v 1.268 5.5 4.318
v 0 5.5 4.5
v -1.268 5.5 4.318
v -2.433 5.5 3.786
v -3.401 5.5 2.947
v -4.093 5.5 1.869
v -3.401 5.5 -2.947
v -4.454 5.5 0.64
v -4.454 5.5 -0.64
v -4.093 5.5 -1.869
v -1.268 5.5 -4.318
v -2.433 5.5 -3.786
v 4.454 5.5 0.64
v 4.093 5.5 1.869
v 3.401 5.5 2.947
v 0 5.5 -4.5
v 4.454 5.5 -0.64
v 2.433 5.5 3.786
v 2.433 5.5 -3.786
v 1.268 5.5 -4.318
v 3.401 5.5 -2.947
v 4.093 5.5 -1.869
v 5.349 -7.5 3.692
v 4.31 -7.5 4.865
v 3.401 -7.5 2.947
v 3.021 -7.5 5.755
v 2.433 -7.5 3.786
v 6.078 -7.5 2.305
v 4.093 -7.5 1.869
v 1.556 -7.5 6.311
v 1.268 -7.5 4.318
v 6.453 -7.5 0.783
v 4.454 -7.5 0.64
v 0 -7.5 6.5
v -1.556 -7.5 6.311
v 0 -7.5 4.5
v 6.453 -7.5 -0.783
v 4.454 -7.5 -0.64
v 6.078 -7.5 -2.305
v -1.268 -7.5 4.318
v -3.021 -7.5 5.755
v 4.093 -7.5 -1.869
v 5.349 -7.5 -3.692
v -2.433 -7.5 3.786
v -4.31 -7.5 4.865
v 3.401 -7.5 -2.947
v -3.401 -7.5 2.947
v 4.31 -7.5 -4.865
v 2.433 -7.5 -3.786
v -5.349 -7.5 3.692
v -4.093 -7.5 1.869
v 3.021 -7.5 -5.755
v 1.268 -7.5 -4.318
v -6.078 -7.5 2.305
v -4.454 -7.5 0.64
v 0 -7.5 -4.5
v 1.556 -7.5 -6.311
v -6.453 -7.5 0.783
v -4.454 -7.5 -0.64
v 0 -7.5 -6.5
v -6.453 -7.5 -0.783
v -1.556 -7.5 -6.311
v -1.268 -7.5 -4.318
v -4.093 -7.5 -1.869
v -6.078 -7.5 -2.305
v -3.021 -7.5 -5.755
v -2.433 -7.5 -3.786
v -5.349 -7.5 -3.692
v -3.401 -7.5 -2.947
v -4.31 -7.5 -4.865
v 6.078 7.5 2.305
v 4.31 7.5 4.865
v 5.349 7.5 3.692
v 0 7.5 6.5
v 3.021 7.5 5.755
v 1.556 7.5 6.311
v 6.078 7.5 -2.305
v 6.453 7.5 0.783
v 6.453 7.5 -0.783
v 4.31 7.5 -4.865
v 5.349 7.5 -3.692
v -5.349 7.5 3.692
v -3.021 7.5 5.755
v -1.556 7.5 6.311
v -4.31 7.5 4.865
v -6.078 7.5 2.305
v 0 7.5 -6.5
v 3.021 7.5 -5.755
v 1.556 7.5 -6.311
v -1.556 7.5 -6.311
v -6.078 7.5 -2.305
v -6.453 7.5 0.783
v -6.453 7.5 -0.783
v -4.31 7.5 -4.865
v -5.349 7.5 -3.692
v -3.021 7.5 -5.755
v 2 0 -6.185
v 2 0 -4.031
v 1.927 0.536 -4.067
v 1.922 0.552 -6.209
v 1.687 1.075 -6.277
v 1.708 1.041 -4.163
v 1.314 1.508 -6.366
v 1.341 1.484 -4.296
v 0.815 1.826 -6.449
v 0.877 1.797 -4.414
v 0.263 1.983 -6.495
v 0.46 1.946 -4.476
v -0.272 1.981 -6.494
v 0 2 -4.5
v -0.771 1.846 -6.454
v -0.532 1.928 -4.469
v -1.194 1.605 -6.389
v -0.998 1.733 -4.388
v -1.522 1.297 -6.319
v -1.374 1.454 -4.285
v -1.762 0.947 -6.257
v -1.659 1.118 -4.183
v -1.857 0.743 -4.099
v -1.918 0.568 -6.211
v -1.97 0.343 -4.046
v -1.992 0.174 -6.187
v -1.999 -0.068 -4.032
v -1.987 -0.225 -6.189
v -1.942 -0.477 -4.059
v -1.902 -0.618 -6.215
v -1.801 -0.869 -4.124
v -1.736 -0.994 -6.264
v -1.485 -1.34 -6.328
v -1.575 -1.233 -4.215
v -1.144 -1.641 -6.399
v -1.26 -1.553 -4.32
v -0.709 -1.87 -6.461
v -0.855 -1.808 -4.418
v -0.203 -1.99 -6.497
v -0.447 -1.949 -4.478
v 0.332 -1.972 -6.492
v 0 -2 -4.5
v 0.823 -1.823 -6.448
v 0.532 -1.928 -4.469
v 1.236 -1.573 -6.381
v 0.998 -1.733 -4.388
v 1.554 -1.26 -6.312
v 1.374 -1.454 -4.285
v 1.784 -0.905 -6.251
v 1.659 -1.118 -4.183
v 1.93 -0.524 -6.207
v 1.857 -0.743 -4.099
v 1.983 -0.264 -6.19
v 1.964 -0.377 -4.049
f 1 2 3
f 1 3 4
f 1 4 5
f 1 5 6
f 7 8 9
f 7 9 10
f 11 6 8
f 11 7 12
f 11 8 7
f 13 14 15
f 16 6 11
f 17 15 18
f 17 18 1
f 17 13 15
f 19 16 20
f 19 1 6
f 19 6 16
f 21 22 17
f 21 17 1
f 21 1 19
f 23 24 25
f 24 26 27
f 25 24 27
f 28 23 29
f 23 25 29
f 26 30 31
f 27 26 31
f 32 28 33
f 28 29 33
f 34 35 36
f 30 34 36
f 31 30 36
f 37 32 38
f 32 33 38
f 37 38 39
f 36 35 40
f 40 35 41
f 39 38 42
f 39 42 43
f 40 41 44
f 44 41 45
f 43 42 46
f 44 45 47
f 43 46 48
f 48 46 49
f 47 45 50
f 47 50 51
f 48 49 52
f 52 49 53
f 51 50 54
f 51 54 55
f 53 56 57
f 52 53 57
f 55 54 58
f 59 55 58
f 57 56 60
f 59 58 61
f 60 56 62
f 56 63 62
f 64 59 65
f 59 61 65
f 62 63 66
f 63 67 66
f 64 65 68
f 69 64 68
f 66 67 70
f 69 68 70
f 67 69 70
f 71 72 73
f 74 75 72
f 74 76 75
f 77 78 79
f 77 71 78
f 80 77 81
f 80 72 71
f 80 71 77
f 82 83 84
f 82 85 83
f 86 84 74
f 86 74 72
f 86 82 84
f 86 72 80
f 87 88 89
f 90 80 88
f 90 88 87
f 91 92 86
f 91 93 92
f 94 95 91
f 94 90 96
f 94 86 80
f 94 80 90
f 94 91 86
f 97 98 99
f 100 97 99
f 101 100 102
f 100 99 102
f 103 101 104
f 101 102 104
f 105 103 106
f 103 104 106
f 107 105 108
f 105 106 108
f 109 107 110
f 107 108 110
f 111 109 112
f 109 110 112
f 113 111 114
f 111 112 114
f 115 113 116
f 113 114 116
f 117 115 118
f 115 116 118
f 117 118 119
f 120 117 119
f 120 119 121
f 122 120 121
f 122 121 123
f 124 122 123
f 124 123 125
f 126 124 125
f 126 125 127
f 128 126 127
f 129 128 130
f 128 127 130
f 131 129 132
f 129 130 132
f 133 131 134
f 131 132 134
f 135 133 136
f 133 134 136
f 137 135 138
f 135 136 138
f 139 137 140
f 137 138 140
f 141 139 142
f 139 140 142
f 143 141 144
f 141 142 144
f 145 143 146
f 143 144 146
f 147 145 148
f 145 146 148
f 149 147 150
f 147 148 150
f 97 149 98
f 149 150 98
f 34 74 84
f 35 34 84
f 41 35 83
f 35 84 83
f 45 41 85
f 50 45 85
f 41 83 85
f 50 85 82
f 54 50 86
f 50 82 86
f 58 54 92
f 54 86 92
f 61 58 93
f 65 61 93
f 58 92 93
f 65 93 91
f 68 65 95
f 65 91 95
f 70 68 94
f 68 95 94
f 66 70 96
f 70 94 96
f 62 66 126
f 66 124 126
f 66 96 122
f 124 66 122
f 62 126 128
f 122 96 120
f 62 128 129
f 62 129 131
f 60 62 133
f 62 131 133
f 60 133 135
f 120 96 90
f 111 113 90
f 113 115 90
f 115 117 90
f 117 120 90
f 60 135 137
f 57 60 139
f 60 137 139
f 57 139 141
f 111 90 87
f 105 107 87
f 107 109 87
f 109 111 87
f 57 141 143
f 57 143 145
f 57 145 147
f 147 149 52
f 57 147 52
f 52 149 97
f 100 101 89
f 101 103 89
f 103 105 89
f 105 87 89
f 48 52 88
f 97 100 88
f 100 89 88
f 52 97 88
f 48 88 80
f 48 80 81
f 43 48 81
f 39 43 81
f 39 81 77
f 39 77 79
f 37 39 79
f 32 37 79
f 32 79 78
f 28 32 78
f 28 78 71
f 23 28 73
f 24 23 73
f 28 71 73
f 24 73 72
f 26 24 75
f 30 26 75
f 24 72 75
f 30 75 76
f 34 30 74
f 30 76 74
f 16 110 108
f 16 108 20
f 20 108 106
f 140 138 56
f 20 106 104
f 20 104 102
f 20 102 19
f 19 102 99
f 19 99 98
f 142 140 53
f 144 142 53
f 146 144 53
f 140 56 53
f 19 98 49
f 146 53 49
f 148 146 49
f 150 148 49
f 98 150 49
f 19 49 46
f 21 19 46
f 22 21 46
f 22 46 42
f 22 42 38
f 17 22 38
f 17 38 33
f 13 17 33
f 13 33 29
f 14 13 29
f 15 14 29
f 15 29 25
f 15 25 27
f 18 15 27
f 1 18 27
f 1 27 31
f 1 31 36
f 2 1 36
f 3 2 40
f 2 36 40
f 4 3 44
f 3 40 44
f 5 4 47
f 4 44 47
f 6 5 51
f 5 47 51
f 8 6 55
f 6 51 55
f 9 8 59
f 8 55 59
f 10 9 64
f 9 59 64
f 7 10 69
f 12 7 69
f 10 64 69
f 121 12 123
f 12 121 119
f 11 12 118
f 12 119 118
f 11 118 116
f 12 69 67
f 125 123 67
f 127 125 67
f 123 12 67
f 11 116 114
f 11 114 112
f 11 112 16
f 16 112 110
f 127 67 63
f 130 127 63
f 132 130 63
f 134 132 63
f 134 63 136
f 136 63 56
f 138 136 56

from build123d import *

# Parameters (mm, degrees)
SKETCH1_W          = 6.5
SKETCH1_H          = 15
SKETCH2_R          = 4.5
CUT_EXTRUDE1_DEPTH = 13
SKETCH3_R          = 2
CUT_EXTRUDE2_DEPTH = 13


with BuildPart() as part:
    # Sketch1 → Revolve1 (revolve)
    with BuildSketch(Plane.XY, mode=Mode.PRIVATE) as revolve1_sk:
        with Locations((3.25, 0)):
            Rectangle(SKETCH1_W, SKETCH1_H)
    revolve(revolve1_sk.sketch.rotate(Axis((0, 7.5, 0), (0, -1, 0)), 90), axis=Axis((0, 7.5, 0), (0, -1, 0)))

    # Sketch2 → Cut-Extrude1 (cut)
    with BuildSketch(Plane.XZ.offset(7.5)):
        with Locations(Location((0, 0, 0), (0, 0, 270))):
            Circle(SKETCH2_R)
    extrude(amount=-CUT_EXTRUDE1_DEPTH, mode=Mode.SUBTRACT)

    # Sketch3 → Cut-Extrude2 (cut)
    with BuildSketch(Plane.XY):
        Circle(SKETCH3_R)
    extrude(amount=-CUT_EXTRUDE2_DEPTH, mode=Mode.SUBTRACT)


solid = part.part
